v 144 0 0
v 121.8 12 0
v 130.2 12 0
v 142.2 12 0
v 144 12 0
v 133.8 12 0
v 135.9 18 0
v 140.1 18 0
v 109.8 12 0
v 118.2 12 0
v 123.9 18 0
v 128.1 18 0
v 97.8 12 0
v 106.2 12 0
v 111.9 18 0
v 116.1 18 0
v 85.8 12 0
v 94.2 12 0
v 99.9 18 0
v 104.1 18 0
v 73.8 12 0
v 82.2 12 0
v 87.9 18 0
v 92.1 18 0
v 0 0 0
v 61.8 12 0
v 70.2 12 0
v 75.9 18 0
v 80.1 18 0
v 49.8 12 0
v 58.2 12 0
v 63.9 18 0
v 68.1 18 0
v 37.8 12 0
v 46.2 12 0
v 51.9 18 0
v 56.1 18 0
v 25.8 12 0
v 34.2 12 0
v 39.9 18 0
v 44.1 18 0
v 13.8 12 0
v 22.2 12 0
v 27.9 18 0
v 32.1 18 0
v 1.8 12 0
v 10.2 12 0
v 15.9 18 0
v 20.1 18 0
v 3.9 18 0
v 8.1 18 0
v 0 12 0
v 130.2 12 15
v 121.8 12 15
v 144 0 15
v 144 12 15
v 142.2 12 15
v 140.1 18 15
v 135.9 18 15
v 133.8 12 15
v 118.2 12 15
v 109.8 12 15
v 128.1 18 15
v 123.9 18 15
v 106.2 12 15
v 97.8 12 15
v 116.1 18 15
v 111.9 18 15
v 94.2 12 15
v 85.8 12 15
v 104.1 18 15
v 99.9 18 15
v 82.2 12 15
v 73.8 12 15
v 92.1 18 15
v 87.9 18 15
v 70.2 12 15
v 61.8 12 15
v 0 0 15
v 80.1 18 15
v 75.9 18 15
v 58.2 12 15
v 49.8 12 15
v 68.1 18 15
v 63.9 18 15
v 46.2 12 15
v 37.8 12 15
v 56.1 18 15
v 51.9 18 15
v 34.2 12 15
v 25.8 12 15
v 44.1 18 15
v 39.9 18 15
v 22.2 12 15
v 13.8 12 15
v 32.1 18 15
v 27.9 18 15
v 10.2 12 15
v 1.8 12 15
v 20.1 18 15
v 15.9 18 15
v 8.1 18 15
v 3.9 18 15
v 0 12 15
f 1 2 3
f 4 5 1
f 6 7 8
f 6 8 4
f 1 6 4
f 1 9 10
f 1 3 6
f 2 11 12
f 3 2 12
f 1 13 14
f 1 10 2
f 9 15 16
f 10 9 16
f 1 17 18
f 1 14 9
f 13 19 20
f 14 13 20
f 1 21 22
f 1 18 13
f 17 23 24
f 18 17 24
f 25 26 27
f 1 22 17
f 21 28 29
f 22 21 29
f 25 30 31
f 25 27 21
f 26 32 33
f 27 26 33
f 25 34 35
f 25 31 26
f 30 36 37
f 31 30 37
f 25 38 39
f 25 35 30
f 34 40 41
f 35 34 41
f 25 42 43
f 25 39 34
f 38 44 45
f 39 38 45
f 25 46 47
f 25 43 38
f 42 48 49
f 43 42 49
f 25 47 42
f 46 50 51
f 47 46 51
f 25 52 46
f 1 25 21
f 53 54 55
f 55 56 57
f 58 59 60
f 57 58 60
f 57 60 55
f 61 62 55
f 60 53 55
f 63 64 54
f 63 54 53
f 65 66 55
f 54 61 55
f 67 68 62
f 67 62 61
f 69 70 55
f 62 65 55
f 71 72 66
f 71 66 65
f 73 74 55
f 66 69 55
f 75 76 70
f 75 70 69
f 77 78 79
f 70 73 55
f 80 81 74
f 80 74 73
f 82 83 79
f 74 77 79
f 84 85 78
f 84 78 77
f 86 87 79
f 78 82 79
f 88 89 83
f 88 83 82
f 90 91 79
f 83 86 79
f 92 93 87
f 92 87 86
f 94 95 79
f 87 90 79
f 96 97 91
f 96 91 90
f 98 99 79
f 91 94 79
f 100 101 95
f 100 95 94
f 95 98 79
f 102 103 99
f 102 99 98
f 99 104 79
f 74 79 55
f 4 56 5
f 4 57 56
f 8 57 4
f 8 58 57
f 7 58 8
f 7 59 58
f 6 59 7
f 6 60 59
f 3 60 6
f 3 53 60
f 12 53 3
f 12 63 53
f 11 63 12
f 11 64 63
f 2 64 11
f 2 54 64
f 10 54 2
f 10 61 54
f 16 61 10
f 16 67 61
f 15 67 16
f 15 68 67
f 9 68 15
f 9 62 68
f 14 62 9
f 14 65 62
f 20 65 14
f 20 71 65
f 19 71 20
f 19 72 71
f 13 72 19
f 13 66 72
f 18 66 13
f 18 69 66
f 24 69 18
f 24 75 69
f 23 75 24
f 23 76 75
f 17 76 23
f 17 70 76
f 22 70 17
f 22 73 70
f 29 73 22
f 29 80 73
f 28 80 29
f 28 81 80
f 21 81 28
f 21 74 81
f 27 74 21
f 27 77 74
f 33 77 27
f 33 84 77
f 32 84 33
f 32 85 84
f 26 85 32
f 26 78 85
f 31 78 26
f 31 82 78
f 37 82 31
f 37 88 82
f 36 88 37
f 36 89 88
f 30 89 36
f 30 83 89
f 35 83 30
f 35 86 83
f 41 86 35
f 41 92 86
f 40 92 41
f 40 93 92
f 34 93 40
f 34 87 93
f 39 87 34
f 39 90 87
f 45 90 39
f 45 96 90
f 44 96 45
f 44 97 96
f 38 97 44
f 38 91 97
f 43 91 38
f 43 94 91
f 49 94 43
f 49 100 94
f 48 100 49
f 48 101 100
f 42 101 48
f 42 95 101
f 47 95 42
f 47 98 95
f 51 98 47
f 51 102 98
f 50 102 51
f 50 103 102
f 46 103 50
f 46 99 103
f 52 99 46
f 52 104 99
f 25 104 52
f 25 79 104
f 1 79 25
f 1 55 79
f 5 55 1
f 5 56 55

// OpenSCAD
$fn = 32;

// ----------------------------------------------------------------------
// Gear rack: 12 teeth, pitch 12 mm
// ----------------------------------------------------------------------

// --- parameters (mm) ---
teeth = 12;               // number of teeth
pitch = 12;               // tooth pitch, X
root_w = 8.4;             // tooth width at the root
tip_w = 4.2;              // tooth width at the tip
base_h = 12;              // rack body height, Y
tooth_h = 6;              // tooth height above the body
plate_t = 15;             // rack width, Z (extrusion height)

rack_l = teeth * pitch;  // overall length
total_h = base_h + tooth_h;  // overall height

profile = [[0, 0], [144, 0], [144, 12], [142.2, 12], [140.1, 18], [135.9, 18], [133.8, 12], [130.2, 12], [128.1, 18], [123.9, 18], [121.8, 12], [118.2, 12], [116.1, 18], [111.9, 18], [109.8, 12], [106.2, 12], [104.1, 18], [99.9, 18], [97.8, 12], [94.2, 12], [92.1, 18], [87.9, 18], [85.8, 12], [82.2, 12], [80.1, 18], [75.9, 18], [73.8, 12], [70.2, 12], [68.1, 18], [63.9, 18], [61.8, 12], [58.2, 12], [56.1, 18], [51.9, 18], [49.8, 12], [46.2, 12], [44.1, 18], [39.9, 18], [37.8, 12], [34.2, 12], [32.1, 18], [27.9, 18], [25.8, 12], [22.2, 12], [20.1, 18], [15.9, 18], [13.8, 12], [10.2, 12], [8.1, 18], [3.9, 18], [1.8, 12], [0, 12]];  // primary outline, 52 points, counter clockwise

// --- the one profile operation ---
linear_extrude(height = plate_t) polygon(points = profile);
